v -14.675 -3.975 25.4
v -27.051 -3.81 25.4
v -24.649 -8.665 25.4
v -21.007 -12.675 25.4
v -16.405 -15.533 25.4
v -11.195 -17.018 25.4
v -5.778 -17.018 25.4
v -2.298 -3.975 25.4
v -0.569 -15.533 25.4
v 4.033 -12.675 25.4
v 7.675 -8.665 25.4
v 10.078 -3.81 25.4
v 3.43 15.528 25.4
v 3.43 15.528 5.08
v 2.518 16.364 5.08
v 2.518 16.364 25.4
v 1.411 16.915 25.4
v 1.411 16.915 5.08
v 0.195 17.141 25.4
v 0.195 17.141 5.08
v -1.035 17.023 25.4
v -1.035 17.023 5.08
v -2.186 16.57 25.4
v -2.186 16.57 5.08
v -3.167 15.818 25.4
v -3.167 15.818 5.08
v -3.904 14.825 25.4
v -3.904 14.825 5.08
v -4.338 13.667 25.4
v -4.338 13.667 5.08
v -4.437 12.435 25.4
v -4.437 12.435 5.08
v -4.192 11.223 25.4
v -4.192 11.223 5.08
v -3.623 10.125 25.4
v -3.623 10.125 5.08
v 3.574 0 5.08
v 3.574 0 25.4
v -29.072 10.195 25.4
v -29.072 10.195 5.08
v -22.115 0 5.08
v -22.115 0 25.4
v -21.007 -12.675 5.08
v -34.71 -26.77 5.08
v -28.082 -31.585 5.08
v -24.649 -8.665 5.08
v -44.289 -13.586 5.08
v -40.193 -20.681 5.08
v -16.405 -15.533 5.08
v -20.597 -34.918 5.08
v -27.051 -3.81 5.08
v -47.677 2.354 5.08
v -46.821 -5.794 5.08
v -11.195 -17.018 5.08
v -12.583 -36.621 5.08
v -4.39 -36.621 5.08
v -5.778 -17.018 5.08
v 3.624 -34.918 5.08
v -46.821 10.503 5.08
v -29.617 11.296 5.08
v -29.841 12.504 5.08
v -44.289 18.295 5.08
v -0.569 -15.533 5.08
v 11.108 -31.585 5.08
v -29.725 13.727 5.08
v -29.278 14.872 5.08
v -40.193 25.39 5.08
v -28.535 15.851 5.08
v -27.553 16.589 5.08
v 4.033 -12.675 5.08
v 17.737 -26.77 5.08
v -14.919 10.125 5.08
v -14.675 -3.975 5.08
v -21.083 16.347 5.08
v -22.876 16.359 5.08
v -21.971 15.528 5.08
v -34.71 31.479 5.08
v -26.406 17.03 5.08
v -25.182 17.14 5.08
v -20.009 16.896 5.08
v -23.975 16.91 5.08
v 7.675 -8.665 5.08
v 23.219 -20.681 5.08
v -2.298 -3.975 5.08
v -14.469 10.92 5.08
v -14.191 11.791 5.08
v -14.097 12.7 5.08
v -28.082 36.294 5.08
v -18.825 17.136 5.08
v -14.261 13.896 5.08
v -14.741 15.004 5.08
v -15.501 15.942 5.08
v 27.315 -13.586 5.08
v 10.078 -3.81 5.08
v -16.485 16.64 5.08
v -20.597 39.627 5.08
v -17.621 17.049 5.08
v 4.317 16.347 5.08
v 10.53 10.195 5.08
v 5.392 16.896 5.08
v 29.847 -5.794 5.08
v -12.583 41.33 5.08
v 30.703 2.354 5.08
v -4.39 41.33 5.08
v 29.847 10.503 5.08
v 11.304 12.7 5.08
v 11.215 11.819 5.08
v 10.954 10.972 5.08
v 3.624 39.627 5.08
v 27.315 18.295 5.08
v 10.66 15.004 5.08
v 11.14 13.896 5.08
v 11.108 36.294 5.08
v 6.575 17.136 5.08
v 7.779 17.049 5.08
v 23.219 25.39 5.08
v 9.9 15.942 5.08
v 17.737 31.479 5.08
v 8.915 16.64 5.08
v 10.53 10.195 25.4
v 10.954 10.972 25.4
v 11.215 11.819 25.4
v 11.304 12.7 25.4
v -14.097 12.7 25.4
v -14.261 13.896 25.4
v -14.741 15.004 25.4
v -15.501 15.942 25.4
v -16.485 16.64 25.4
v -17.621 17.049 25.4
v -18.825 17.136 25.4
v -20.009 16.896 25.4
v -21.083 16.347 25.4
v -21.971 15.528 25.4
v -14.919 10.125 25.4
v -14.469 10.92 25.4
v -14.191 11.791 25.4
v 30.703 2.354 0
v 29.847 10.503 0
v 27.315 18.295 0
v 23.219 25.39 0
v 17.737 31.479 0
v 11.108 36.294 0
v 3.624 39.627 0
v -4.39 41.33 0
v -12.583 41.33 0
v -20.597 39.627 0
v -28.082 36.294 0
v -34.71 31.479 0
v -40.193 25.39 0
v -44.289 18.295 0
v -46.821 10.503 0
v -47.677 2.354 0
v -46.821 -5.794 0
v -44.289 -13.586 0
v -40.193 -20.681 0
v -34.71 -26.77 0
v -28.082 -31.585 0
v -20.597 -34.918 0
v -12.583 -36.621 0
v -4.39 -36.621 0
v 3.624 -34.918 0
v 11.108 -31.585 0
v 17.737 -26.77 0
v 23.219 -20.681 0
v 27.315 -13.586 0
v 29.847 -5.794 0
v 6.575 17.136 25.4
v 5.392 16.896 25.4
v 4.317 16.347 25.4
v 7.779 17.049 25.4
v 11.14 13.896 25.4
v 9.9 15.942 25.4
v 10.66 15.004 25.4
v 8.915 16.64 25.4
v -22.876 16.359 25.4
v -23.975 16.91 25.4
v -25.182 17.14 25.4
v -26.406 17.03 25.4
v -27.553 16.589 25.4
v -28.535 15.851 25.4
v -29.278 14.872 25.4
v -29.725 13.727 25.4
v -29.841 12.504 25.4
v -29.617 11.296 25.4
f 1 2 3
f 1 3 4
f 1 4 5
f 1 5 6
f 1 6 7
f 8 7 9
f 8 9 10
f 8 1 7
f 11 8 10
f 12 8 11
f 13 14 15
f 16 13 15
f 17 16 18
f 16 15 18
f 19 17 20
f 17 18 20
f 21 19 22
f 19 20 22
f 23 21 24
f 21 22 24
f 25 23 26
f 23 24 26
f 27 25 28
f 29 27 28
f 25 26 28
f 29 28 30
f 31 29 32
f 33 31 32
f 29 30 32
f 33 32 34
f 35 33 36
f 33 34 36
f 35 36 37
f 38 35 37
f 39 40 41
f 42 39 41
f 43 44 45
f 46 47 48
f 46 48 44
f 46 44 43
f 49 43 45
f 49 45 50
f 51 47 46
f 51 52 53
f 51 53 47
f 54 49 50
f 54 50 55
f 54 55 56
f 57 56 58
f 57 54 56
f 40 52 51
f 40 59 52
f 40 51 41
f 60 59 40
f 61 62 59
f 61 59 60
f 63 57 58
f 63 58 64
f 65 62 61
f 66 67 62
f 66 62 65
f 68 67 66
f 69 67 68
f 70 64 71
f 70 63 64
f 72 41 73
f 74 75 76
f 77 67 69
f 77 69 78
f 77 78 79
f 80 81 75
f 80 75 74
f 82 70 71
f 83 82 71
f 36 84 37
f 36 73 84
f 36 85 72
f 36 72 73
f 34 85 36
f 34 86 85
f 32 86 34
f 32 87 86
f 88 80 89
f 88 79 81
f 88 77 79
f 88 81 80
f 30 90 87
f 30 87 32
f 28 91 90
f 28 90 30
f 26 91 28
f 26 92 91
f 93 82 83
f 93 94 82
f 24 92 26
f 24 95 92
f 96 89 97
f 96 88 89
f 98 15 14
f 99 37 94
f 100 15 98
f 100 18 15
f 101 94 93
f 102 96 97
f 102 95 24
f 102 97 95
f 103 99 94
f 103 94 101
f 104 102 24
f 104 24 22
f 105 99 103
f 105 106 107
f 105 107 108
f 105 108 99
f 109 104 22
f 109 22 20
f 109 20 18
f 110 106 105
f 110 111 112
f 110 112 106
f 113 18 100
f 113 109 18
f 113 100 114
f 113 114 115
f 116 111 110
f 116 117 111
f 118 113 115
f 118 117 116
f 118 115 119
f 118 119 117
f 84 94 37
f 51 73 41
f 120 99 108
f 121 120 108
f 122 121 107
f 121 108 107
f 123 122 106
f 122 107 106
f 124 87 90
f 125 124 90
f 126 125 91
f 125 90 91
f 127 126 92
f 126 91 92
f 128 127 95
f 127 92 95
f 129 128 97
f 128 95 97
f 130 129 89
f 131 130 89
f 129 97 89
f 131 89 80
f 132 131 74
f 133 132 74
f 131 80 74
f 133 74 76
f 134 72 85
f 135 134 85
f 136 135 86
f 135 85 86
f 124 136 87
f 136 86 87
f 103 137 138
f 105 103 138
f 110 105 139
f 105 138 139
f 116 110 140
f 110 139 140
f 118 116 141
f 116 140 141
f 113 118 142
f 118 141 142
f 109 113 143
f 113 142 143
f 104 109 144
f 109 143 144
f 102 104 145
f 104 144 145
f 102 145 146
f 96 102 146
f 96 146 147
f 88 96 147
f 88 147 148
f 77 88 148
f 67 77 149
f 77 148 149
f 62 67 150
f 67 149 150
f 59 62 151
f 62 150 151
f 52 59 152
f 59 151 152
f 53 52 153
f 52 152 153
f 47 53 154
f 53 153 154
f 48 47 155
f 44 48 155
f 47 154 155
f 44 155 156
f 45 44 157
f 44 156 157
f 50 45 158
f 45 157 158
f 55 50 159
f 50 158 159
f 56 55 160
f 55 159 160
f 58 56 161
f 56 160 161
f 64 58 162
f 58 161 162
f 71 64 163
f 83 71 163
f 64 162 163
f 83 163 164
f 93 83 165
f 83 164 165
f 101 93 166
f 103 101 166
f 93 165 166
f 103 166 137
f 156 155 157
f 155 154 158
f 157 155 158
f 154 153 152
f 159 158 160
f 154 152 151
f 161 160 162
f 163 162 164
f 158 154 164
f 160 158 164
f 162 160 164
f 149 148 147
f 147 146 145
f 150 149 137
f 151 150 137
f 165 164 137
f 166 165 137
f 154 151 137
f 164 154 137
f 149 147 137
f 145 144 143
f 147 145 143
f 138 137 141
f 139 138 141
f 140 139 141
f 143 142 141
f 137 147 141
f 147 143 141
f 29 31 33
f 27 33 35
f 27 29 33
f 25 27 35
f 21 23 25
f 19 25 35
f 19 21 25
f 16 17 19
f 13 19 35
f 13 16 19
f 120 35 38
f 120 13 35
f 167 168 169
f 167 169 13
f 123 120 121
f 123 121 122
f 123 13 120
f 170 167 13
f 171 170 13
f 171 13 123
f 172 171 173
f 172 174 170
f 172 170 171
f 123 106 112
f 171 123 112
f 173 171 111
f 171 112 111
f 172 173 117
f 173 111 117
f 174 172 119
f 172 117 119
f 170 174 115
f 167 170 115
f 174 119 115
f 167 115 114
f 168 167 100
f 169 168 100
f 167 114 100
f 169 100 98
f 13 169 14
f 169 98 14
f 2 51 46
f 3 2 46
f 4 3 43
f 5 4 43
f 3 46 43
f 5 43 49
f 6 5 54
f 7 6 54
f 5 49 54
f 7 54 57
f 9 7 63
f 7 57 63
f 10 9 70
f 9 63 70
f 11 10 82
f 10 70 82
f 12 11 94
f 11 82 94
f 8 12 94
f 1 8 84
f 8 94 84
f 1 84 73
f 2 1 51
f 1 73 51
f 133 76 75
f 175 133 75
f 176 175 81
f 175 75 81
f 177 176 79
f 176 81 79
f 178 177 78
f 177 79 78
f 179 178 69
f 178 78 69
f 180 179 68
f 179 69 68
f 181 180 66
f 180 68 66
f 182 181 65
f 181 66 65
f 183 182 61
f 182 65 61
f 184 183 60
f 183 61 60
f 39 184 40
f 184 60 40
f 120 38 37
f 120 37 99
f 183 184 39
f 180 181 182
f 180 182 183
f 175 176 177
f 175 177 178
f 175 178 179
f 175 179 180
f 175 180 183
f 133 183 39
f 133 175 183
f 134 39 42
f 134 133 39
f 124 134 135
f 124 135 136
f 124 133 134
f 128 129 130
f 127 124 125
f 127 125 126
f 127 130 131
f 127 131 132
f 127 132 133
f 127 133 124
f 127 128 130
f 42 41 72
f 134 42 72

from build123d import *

# Parameters (mm, degrees)
F1_DEPTH = 25.4
F2_R     = 39.1903568665
F3_DEPTH = 5.08


with BuildPart() as f1:
    # F0 (on Top) → F1 (new body)
    with BuildSketch(Plane.XY):
        with BuildLine():
            ThreePointArc((-21.971, 9.8715757037), (-21.2167040506, 11.1973157351), (-20.955, 12.7))
            ThreePointArc((-20.955, 12.7), (-21.2167040506, 14.2026842649), (-21.971, 15.5284242963))
            ThreePointArc((-21.971, 15.5284242963), (-22.987, 12.7), (-21.971, 9.8715757037))
        make_face()
        with BuildLine():
            ThreePointArc((-21.971, 15.5284242963), (-21.2167040506, 14.2026842649), (-20.955, 12.7))
            ThreePointArc((-20.955, 12.7), (-21.2167040506, 11.1973157351), (-21.971, 9.8715757037))
            ThreePointArc((-21.971, 9.8715757037), (-18.3824406922, 8.2578647221), (-14.9189074762, 10.1248833882))
            ThreePointArc((-14.9189074762, 10.1248833882), (-14.307459218, 11.3484492736), (-14.097, 12.7))
            ThreePointArc((-14.097, 12.7), (-17.0393157351, 16.8832959494), (-21.971, 15.5284242963))
        make_face()
        with BuildLine():
            ThreePointArc((-21.971, 9.8715757037), (-22.987, 12.7), (-21.971, 15.5284242963))
            ThreePointArc((-21.971, 15.5284242963), (-28.0696752968, 16.2539919541), (-29.0716406137, 10.1945898132))
            ThreePointArc((-29.0716406137, 10.1945898132), (-25.6019978851, 8.2595921522), (-21.971, 9.8715757037))
        make_face()
        with BuildLine():
            ThreePointArc((-14.9189074762, 10.1248833882), (-18.3824406922, 8.2578647221), (-21.971, 9.8715757037))
            ThreePointArc((-21.971, 9.8715757037), (-25.6019978851, 8.2595921522), (-29.0716406137, 10.1945898132))
            Line((-29.0716406137, 10.1945898132), (-22.1151784062, 0))
            Line((-22.1151784062, 0), (-14.9189074762, 10.1248833882))
        make_face()
    extrude(amount=F1_DEPTH)



with BuildPart() as f1b:
    # F0 (on Top) → F1, piece 2 (new body)
    with BuildSketch(Plane.XY):
        with BuildLine():
            ThreePointArc((3.4295447311, 9.8715757037), (7.0605426162, 8.2595921522), (10.5301853448, 10.1945898132))
            ThreePointArc((10.5301853448, 10.1945898132), (11.1058066449, 11.388973213), (11.3035447311, 12.7))
            ThreePointArc((11.3035447311, 12.7), (8.361228996, 16.8832959494), (3.4295447311, 15.5284242963))
            ThreePointArc((3.4295447311, 15.5284242963), (4.1838406805, 14.2026842649), (4.4455447311, 12.7))
            ThreePointArc((4.4455447311, 12.7), (4.1838406805, 11.1973157351), (3.4295447311, 9.8715757037))
        make_face()
        with BuildLine():
            Line((3.5737231374, 0), (10.5301853448, 10.1945898132))
            ThreePointArc((10.5301853448, 10.1945898132), (7.0605426162, 8.2595921522), (3.4295447311, 9.8715757037))
            ThreePointArc((3.4295447311, 9.8715757037), (-0.1590145767, 8.2578647221), (-3.6225477926, 10.1248833882))
            Line((-3.6225477926, 10.1248833882), (3.5737231374, 0))
        make_face()
        with BuildLine():
            ThreePointArc((-3.6225477926, 10.1248833882), (-0.1590145767, 8.2578647221), (3.4295447311, 9.8715757037))
            ThreePointArc((3.4295447311, 9.8715757037), (2.4135447311, 12.7), (3.4295447311, 15.5284242963))
            ThreePointArc((3.4295447311, 15.5284242963), (-2.702968088, 16.2283202004), (-3.6225477926, 10.1248833882))
        make_face()
        with BuildLine():
            ThreePointArc((3.4295447311, 15.5284242963), (2.4135447311, 12.7), (3.4295447311, 9.8715757037))
            ThreePointArc((3.4295447311, 9.8715757037), (4.1838406805, 11.1973157351), (4.4455447311, 12.7))
            ThreePointArc((4.4455447311, 12.7), (4.1838406805, 14.2026842649), (3.4295447311, 15.5284242963))
        make_face()
    extrude(amount=F1_DEPTH)


with BuildPart() as f1c:
    # F0 (on Top) → F1, piece 3 (new body)
    with BuildSketch(Plane.XY):
        with BuildLine():
            ThreePointArc((10.0777297444, -3.81), (-8.4868707531, -3.9956055876), (-27.0514712505, -3.81))
            ThreePointArc((-27.0514712506, -3.81), (-8.4868707531, -17.2068977255), (10.0777297444, -3.81))
        make_face()
    extrude(amount=F1_DEPTH)


with BuildPart() as f1_1:
    add(f1.part)

    add(f1b.part)  # F3 merges F1b

    add(f1c.part)  # F3 merges F1c
    # F2 (on Top) → F3 (join)
    with BuildSketch(Plane.XY):
        with Locations((-8.4868707531, 2.3543944123)):
            Circle(F2_R)
    extrude(amount=F3_DEPTH)


solid = f1_1.part
